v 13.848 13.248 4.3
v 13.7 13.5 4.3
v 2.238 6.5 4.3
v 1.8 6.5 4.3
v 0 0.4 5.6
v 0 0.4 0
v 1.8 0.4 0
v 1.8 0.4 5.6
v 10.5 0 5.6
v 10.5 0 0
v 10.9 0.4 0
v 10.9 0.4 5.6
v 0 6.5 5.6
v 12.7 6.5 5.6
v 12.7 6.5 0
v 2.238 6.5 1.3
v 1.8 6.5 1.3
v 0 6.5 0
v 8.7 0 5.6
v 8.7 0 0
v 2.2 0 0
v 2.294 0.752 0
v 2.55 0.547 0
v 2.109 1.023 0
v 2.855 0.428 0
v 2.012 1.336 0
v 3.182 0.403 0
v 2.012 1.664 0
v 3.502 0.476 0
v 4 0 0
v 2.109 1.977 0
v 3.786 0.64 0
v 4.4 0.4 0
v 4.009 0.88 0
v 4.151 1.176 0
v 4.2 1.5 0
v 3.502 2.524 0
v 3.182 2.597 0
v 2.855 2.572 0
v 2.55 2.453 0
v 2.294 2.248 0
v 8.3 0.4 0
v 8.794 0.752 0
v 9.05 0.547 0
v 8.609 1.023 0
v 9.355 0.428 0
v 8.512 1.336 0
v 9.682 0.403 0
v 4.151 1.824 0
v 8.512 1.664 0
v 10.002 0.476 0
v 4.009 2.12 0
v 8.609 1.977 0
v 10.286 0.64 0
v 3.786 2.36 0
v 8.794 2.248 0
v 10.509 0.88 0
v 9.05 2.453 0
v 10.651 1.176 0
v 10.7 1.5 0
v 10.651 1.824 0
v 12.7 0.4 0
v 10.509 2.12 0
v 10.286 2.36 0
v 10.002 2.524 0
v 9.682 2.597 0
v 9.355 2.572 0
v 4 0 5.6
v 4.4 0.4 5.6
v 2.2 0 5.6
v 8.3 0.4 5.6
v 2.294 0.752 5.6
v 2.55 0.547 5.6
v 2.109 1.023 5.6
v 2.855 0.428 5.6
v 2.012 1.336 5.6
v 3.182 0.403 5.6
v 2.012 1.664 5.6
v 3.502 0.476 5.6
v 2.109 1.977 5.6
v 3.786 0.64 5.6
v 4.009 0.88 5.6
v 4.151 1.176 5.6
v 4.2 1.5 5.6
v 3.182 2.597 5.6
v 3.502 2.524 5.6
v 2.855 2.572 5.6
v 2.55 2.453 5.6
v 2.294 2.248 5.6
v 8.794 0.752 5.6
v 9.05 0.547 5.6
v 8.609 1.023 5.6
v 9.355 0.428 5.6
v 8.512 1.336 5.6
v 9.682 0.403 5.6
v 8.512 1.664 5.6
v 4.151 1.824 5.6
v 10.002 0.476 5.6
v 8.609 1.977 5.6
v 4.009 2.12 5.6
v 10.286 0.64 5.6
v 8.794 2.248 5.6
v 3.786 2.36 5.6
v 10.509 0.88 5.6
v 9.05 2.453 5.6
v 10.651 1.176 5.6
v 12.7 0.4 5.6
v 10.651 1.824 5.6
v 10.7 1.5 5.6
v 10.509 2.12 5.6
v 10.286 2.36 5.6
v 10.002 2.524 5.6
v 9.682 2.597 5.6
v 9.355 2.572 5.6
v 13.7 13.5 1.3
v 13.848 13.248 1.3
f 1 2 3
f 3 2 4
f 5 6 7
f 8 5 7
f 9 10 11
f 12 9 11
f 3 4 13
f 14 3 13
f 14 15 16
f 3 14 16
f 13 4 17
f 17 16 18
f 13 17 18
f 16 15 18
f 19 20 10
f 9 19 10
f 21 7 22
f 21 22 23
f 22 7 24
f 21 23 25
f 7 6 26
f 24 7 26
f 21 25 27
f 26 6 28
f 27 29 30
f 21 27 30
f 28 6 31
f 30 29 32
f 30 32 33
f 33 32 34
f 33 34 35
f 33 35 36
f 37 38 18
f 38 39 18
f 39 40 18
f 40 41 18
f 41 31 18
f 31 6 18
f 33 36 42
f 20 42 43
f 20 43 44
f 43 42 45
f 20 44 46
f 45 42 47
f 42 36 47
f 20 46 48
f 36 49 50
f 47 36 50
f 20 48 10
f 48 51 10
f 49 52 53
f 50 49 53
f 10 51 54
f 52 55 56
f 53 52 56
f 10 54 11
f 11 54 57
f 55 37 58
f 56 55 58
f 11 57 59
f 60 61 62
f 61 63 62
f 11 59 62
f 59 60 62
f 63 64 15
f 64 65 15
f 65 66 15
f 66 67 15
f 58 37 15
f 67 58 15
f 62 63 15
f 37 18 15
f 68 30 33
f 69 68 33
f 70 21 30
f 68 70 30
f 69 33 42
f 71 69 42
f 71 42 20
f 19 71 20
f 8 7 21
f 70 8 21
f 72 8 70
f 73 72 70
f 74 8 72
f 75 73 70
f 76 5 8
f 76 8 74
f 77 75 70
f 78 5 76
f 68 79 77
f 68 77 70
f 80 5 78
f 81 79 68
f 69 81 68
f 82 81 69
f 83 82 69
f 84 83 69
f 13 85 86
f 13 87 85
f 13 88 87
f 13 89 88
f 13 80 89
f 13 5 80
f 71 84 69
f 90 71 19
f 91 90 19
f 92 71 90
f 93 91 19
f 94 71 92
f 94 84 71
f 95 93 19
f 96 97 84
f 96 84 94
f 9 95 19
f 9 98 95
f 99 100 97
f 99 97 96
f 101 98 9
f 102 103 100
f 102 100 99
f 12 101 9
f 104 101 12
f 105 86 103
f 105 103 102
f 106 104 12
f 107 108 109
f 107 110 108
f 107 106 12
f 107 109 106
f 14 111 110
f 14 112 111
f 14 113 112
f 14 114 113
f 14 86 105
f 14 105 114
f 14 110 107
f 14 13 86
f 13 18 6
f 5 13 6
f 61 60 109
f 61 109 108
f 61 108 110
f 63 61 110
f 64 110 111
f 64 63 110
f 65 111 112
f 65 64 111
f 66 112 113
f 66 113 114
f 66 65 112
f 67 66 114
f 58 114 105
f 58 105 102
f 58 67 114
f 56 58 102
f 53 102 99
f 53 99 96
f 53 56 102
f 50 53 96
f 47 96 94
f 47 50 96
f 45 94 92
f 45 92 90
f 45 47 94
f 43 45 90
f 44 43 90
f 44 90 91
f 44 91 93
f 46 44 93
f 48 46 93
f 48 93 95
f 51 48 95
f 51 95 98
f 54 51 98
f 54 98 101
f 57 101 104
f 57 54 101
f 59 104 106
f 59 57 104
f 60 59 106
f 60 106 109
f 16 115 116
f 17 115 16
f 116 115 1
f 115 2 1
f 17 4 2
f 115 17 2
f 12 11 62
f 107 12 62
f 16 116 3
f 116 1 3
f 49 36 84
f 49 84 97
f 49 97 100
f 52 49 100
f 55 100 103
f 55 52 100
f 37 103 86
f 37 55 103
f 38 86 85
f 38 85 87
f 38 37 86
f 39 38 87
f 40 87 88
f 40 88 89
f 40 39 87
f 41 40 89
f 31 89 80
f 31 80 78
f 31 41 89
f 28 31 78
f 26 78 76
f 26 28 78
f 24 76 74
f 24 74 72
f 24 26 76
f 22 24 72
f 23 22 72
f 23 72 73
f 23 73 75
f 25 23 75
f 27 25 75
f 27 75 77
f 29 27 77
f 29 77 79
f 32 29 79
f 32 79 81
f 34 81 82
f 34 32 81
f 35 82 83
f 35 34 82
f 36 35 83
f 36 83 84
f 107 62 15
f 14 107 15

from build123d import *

# Parameters (mm, degrees)
SKETCH_1_R      = 1.1
EXTRUDE_1_DEPTH = 5.6
EXTRUDE_2_DEPTH = 1.5


with BuildPart() as part:
    # 草图1 → 凸台-拉伸1 (new body)
    with BuildSketch(Plane.XY):
        Polygon((1.8, 0.4), (2.2, 0), (4, 0), (4.4, 0.4), (8.3, 0.4), (8.7, 0), (10.5, 0), (10.9, 0.4), (12.7, 0.4), (12.7, 6.5), (2.517906402, 6.5), (2, 6.5), (0, 6.5), (0, 0.4), align=None)
        with Locations((3.1, 1.5)):
            Circle(SKETCH_1_R, mode=Mode.SUBTRACT)
        with Locations((9.6, 1.5)):
            Circle(SKETCH_1_R, mode=Mode.SUBTRACT)
    extrude(amount=EXTRUDE_1_DEPTH)

    # 草图3 → 凸台-拉伸2 (add, symmetric)
    with BuildSketch(Plane.XY.offset(2.8)):
        Polygon((1.8, 6.5), (13.7, 13.5), (13.84831969, 13.247856527), (2.238287657, 6.5), align=None)
    extrude(amount=EXTRUDE_2_DEPTH, both=True)


solid = part.part
